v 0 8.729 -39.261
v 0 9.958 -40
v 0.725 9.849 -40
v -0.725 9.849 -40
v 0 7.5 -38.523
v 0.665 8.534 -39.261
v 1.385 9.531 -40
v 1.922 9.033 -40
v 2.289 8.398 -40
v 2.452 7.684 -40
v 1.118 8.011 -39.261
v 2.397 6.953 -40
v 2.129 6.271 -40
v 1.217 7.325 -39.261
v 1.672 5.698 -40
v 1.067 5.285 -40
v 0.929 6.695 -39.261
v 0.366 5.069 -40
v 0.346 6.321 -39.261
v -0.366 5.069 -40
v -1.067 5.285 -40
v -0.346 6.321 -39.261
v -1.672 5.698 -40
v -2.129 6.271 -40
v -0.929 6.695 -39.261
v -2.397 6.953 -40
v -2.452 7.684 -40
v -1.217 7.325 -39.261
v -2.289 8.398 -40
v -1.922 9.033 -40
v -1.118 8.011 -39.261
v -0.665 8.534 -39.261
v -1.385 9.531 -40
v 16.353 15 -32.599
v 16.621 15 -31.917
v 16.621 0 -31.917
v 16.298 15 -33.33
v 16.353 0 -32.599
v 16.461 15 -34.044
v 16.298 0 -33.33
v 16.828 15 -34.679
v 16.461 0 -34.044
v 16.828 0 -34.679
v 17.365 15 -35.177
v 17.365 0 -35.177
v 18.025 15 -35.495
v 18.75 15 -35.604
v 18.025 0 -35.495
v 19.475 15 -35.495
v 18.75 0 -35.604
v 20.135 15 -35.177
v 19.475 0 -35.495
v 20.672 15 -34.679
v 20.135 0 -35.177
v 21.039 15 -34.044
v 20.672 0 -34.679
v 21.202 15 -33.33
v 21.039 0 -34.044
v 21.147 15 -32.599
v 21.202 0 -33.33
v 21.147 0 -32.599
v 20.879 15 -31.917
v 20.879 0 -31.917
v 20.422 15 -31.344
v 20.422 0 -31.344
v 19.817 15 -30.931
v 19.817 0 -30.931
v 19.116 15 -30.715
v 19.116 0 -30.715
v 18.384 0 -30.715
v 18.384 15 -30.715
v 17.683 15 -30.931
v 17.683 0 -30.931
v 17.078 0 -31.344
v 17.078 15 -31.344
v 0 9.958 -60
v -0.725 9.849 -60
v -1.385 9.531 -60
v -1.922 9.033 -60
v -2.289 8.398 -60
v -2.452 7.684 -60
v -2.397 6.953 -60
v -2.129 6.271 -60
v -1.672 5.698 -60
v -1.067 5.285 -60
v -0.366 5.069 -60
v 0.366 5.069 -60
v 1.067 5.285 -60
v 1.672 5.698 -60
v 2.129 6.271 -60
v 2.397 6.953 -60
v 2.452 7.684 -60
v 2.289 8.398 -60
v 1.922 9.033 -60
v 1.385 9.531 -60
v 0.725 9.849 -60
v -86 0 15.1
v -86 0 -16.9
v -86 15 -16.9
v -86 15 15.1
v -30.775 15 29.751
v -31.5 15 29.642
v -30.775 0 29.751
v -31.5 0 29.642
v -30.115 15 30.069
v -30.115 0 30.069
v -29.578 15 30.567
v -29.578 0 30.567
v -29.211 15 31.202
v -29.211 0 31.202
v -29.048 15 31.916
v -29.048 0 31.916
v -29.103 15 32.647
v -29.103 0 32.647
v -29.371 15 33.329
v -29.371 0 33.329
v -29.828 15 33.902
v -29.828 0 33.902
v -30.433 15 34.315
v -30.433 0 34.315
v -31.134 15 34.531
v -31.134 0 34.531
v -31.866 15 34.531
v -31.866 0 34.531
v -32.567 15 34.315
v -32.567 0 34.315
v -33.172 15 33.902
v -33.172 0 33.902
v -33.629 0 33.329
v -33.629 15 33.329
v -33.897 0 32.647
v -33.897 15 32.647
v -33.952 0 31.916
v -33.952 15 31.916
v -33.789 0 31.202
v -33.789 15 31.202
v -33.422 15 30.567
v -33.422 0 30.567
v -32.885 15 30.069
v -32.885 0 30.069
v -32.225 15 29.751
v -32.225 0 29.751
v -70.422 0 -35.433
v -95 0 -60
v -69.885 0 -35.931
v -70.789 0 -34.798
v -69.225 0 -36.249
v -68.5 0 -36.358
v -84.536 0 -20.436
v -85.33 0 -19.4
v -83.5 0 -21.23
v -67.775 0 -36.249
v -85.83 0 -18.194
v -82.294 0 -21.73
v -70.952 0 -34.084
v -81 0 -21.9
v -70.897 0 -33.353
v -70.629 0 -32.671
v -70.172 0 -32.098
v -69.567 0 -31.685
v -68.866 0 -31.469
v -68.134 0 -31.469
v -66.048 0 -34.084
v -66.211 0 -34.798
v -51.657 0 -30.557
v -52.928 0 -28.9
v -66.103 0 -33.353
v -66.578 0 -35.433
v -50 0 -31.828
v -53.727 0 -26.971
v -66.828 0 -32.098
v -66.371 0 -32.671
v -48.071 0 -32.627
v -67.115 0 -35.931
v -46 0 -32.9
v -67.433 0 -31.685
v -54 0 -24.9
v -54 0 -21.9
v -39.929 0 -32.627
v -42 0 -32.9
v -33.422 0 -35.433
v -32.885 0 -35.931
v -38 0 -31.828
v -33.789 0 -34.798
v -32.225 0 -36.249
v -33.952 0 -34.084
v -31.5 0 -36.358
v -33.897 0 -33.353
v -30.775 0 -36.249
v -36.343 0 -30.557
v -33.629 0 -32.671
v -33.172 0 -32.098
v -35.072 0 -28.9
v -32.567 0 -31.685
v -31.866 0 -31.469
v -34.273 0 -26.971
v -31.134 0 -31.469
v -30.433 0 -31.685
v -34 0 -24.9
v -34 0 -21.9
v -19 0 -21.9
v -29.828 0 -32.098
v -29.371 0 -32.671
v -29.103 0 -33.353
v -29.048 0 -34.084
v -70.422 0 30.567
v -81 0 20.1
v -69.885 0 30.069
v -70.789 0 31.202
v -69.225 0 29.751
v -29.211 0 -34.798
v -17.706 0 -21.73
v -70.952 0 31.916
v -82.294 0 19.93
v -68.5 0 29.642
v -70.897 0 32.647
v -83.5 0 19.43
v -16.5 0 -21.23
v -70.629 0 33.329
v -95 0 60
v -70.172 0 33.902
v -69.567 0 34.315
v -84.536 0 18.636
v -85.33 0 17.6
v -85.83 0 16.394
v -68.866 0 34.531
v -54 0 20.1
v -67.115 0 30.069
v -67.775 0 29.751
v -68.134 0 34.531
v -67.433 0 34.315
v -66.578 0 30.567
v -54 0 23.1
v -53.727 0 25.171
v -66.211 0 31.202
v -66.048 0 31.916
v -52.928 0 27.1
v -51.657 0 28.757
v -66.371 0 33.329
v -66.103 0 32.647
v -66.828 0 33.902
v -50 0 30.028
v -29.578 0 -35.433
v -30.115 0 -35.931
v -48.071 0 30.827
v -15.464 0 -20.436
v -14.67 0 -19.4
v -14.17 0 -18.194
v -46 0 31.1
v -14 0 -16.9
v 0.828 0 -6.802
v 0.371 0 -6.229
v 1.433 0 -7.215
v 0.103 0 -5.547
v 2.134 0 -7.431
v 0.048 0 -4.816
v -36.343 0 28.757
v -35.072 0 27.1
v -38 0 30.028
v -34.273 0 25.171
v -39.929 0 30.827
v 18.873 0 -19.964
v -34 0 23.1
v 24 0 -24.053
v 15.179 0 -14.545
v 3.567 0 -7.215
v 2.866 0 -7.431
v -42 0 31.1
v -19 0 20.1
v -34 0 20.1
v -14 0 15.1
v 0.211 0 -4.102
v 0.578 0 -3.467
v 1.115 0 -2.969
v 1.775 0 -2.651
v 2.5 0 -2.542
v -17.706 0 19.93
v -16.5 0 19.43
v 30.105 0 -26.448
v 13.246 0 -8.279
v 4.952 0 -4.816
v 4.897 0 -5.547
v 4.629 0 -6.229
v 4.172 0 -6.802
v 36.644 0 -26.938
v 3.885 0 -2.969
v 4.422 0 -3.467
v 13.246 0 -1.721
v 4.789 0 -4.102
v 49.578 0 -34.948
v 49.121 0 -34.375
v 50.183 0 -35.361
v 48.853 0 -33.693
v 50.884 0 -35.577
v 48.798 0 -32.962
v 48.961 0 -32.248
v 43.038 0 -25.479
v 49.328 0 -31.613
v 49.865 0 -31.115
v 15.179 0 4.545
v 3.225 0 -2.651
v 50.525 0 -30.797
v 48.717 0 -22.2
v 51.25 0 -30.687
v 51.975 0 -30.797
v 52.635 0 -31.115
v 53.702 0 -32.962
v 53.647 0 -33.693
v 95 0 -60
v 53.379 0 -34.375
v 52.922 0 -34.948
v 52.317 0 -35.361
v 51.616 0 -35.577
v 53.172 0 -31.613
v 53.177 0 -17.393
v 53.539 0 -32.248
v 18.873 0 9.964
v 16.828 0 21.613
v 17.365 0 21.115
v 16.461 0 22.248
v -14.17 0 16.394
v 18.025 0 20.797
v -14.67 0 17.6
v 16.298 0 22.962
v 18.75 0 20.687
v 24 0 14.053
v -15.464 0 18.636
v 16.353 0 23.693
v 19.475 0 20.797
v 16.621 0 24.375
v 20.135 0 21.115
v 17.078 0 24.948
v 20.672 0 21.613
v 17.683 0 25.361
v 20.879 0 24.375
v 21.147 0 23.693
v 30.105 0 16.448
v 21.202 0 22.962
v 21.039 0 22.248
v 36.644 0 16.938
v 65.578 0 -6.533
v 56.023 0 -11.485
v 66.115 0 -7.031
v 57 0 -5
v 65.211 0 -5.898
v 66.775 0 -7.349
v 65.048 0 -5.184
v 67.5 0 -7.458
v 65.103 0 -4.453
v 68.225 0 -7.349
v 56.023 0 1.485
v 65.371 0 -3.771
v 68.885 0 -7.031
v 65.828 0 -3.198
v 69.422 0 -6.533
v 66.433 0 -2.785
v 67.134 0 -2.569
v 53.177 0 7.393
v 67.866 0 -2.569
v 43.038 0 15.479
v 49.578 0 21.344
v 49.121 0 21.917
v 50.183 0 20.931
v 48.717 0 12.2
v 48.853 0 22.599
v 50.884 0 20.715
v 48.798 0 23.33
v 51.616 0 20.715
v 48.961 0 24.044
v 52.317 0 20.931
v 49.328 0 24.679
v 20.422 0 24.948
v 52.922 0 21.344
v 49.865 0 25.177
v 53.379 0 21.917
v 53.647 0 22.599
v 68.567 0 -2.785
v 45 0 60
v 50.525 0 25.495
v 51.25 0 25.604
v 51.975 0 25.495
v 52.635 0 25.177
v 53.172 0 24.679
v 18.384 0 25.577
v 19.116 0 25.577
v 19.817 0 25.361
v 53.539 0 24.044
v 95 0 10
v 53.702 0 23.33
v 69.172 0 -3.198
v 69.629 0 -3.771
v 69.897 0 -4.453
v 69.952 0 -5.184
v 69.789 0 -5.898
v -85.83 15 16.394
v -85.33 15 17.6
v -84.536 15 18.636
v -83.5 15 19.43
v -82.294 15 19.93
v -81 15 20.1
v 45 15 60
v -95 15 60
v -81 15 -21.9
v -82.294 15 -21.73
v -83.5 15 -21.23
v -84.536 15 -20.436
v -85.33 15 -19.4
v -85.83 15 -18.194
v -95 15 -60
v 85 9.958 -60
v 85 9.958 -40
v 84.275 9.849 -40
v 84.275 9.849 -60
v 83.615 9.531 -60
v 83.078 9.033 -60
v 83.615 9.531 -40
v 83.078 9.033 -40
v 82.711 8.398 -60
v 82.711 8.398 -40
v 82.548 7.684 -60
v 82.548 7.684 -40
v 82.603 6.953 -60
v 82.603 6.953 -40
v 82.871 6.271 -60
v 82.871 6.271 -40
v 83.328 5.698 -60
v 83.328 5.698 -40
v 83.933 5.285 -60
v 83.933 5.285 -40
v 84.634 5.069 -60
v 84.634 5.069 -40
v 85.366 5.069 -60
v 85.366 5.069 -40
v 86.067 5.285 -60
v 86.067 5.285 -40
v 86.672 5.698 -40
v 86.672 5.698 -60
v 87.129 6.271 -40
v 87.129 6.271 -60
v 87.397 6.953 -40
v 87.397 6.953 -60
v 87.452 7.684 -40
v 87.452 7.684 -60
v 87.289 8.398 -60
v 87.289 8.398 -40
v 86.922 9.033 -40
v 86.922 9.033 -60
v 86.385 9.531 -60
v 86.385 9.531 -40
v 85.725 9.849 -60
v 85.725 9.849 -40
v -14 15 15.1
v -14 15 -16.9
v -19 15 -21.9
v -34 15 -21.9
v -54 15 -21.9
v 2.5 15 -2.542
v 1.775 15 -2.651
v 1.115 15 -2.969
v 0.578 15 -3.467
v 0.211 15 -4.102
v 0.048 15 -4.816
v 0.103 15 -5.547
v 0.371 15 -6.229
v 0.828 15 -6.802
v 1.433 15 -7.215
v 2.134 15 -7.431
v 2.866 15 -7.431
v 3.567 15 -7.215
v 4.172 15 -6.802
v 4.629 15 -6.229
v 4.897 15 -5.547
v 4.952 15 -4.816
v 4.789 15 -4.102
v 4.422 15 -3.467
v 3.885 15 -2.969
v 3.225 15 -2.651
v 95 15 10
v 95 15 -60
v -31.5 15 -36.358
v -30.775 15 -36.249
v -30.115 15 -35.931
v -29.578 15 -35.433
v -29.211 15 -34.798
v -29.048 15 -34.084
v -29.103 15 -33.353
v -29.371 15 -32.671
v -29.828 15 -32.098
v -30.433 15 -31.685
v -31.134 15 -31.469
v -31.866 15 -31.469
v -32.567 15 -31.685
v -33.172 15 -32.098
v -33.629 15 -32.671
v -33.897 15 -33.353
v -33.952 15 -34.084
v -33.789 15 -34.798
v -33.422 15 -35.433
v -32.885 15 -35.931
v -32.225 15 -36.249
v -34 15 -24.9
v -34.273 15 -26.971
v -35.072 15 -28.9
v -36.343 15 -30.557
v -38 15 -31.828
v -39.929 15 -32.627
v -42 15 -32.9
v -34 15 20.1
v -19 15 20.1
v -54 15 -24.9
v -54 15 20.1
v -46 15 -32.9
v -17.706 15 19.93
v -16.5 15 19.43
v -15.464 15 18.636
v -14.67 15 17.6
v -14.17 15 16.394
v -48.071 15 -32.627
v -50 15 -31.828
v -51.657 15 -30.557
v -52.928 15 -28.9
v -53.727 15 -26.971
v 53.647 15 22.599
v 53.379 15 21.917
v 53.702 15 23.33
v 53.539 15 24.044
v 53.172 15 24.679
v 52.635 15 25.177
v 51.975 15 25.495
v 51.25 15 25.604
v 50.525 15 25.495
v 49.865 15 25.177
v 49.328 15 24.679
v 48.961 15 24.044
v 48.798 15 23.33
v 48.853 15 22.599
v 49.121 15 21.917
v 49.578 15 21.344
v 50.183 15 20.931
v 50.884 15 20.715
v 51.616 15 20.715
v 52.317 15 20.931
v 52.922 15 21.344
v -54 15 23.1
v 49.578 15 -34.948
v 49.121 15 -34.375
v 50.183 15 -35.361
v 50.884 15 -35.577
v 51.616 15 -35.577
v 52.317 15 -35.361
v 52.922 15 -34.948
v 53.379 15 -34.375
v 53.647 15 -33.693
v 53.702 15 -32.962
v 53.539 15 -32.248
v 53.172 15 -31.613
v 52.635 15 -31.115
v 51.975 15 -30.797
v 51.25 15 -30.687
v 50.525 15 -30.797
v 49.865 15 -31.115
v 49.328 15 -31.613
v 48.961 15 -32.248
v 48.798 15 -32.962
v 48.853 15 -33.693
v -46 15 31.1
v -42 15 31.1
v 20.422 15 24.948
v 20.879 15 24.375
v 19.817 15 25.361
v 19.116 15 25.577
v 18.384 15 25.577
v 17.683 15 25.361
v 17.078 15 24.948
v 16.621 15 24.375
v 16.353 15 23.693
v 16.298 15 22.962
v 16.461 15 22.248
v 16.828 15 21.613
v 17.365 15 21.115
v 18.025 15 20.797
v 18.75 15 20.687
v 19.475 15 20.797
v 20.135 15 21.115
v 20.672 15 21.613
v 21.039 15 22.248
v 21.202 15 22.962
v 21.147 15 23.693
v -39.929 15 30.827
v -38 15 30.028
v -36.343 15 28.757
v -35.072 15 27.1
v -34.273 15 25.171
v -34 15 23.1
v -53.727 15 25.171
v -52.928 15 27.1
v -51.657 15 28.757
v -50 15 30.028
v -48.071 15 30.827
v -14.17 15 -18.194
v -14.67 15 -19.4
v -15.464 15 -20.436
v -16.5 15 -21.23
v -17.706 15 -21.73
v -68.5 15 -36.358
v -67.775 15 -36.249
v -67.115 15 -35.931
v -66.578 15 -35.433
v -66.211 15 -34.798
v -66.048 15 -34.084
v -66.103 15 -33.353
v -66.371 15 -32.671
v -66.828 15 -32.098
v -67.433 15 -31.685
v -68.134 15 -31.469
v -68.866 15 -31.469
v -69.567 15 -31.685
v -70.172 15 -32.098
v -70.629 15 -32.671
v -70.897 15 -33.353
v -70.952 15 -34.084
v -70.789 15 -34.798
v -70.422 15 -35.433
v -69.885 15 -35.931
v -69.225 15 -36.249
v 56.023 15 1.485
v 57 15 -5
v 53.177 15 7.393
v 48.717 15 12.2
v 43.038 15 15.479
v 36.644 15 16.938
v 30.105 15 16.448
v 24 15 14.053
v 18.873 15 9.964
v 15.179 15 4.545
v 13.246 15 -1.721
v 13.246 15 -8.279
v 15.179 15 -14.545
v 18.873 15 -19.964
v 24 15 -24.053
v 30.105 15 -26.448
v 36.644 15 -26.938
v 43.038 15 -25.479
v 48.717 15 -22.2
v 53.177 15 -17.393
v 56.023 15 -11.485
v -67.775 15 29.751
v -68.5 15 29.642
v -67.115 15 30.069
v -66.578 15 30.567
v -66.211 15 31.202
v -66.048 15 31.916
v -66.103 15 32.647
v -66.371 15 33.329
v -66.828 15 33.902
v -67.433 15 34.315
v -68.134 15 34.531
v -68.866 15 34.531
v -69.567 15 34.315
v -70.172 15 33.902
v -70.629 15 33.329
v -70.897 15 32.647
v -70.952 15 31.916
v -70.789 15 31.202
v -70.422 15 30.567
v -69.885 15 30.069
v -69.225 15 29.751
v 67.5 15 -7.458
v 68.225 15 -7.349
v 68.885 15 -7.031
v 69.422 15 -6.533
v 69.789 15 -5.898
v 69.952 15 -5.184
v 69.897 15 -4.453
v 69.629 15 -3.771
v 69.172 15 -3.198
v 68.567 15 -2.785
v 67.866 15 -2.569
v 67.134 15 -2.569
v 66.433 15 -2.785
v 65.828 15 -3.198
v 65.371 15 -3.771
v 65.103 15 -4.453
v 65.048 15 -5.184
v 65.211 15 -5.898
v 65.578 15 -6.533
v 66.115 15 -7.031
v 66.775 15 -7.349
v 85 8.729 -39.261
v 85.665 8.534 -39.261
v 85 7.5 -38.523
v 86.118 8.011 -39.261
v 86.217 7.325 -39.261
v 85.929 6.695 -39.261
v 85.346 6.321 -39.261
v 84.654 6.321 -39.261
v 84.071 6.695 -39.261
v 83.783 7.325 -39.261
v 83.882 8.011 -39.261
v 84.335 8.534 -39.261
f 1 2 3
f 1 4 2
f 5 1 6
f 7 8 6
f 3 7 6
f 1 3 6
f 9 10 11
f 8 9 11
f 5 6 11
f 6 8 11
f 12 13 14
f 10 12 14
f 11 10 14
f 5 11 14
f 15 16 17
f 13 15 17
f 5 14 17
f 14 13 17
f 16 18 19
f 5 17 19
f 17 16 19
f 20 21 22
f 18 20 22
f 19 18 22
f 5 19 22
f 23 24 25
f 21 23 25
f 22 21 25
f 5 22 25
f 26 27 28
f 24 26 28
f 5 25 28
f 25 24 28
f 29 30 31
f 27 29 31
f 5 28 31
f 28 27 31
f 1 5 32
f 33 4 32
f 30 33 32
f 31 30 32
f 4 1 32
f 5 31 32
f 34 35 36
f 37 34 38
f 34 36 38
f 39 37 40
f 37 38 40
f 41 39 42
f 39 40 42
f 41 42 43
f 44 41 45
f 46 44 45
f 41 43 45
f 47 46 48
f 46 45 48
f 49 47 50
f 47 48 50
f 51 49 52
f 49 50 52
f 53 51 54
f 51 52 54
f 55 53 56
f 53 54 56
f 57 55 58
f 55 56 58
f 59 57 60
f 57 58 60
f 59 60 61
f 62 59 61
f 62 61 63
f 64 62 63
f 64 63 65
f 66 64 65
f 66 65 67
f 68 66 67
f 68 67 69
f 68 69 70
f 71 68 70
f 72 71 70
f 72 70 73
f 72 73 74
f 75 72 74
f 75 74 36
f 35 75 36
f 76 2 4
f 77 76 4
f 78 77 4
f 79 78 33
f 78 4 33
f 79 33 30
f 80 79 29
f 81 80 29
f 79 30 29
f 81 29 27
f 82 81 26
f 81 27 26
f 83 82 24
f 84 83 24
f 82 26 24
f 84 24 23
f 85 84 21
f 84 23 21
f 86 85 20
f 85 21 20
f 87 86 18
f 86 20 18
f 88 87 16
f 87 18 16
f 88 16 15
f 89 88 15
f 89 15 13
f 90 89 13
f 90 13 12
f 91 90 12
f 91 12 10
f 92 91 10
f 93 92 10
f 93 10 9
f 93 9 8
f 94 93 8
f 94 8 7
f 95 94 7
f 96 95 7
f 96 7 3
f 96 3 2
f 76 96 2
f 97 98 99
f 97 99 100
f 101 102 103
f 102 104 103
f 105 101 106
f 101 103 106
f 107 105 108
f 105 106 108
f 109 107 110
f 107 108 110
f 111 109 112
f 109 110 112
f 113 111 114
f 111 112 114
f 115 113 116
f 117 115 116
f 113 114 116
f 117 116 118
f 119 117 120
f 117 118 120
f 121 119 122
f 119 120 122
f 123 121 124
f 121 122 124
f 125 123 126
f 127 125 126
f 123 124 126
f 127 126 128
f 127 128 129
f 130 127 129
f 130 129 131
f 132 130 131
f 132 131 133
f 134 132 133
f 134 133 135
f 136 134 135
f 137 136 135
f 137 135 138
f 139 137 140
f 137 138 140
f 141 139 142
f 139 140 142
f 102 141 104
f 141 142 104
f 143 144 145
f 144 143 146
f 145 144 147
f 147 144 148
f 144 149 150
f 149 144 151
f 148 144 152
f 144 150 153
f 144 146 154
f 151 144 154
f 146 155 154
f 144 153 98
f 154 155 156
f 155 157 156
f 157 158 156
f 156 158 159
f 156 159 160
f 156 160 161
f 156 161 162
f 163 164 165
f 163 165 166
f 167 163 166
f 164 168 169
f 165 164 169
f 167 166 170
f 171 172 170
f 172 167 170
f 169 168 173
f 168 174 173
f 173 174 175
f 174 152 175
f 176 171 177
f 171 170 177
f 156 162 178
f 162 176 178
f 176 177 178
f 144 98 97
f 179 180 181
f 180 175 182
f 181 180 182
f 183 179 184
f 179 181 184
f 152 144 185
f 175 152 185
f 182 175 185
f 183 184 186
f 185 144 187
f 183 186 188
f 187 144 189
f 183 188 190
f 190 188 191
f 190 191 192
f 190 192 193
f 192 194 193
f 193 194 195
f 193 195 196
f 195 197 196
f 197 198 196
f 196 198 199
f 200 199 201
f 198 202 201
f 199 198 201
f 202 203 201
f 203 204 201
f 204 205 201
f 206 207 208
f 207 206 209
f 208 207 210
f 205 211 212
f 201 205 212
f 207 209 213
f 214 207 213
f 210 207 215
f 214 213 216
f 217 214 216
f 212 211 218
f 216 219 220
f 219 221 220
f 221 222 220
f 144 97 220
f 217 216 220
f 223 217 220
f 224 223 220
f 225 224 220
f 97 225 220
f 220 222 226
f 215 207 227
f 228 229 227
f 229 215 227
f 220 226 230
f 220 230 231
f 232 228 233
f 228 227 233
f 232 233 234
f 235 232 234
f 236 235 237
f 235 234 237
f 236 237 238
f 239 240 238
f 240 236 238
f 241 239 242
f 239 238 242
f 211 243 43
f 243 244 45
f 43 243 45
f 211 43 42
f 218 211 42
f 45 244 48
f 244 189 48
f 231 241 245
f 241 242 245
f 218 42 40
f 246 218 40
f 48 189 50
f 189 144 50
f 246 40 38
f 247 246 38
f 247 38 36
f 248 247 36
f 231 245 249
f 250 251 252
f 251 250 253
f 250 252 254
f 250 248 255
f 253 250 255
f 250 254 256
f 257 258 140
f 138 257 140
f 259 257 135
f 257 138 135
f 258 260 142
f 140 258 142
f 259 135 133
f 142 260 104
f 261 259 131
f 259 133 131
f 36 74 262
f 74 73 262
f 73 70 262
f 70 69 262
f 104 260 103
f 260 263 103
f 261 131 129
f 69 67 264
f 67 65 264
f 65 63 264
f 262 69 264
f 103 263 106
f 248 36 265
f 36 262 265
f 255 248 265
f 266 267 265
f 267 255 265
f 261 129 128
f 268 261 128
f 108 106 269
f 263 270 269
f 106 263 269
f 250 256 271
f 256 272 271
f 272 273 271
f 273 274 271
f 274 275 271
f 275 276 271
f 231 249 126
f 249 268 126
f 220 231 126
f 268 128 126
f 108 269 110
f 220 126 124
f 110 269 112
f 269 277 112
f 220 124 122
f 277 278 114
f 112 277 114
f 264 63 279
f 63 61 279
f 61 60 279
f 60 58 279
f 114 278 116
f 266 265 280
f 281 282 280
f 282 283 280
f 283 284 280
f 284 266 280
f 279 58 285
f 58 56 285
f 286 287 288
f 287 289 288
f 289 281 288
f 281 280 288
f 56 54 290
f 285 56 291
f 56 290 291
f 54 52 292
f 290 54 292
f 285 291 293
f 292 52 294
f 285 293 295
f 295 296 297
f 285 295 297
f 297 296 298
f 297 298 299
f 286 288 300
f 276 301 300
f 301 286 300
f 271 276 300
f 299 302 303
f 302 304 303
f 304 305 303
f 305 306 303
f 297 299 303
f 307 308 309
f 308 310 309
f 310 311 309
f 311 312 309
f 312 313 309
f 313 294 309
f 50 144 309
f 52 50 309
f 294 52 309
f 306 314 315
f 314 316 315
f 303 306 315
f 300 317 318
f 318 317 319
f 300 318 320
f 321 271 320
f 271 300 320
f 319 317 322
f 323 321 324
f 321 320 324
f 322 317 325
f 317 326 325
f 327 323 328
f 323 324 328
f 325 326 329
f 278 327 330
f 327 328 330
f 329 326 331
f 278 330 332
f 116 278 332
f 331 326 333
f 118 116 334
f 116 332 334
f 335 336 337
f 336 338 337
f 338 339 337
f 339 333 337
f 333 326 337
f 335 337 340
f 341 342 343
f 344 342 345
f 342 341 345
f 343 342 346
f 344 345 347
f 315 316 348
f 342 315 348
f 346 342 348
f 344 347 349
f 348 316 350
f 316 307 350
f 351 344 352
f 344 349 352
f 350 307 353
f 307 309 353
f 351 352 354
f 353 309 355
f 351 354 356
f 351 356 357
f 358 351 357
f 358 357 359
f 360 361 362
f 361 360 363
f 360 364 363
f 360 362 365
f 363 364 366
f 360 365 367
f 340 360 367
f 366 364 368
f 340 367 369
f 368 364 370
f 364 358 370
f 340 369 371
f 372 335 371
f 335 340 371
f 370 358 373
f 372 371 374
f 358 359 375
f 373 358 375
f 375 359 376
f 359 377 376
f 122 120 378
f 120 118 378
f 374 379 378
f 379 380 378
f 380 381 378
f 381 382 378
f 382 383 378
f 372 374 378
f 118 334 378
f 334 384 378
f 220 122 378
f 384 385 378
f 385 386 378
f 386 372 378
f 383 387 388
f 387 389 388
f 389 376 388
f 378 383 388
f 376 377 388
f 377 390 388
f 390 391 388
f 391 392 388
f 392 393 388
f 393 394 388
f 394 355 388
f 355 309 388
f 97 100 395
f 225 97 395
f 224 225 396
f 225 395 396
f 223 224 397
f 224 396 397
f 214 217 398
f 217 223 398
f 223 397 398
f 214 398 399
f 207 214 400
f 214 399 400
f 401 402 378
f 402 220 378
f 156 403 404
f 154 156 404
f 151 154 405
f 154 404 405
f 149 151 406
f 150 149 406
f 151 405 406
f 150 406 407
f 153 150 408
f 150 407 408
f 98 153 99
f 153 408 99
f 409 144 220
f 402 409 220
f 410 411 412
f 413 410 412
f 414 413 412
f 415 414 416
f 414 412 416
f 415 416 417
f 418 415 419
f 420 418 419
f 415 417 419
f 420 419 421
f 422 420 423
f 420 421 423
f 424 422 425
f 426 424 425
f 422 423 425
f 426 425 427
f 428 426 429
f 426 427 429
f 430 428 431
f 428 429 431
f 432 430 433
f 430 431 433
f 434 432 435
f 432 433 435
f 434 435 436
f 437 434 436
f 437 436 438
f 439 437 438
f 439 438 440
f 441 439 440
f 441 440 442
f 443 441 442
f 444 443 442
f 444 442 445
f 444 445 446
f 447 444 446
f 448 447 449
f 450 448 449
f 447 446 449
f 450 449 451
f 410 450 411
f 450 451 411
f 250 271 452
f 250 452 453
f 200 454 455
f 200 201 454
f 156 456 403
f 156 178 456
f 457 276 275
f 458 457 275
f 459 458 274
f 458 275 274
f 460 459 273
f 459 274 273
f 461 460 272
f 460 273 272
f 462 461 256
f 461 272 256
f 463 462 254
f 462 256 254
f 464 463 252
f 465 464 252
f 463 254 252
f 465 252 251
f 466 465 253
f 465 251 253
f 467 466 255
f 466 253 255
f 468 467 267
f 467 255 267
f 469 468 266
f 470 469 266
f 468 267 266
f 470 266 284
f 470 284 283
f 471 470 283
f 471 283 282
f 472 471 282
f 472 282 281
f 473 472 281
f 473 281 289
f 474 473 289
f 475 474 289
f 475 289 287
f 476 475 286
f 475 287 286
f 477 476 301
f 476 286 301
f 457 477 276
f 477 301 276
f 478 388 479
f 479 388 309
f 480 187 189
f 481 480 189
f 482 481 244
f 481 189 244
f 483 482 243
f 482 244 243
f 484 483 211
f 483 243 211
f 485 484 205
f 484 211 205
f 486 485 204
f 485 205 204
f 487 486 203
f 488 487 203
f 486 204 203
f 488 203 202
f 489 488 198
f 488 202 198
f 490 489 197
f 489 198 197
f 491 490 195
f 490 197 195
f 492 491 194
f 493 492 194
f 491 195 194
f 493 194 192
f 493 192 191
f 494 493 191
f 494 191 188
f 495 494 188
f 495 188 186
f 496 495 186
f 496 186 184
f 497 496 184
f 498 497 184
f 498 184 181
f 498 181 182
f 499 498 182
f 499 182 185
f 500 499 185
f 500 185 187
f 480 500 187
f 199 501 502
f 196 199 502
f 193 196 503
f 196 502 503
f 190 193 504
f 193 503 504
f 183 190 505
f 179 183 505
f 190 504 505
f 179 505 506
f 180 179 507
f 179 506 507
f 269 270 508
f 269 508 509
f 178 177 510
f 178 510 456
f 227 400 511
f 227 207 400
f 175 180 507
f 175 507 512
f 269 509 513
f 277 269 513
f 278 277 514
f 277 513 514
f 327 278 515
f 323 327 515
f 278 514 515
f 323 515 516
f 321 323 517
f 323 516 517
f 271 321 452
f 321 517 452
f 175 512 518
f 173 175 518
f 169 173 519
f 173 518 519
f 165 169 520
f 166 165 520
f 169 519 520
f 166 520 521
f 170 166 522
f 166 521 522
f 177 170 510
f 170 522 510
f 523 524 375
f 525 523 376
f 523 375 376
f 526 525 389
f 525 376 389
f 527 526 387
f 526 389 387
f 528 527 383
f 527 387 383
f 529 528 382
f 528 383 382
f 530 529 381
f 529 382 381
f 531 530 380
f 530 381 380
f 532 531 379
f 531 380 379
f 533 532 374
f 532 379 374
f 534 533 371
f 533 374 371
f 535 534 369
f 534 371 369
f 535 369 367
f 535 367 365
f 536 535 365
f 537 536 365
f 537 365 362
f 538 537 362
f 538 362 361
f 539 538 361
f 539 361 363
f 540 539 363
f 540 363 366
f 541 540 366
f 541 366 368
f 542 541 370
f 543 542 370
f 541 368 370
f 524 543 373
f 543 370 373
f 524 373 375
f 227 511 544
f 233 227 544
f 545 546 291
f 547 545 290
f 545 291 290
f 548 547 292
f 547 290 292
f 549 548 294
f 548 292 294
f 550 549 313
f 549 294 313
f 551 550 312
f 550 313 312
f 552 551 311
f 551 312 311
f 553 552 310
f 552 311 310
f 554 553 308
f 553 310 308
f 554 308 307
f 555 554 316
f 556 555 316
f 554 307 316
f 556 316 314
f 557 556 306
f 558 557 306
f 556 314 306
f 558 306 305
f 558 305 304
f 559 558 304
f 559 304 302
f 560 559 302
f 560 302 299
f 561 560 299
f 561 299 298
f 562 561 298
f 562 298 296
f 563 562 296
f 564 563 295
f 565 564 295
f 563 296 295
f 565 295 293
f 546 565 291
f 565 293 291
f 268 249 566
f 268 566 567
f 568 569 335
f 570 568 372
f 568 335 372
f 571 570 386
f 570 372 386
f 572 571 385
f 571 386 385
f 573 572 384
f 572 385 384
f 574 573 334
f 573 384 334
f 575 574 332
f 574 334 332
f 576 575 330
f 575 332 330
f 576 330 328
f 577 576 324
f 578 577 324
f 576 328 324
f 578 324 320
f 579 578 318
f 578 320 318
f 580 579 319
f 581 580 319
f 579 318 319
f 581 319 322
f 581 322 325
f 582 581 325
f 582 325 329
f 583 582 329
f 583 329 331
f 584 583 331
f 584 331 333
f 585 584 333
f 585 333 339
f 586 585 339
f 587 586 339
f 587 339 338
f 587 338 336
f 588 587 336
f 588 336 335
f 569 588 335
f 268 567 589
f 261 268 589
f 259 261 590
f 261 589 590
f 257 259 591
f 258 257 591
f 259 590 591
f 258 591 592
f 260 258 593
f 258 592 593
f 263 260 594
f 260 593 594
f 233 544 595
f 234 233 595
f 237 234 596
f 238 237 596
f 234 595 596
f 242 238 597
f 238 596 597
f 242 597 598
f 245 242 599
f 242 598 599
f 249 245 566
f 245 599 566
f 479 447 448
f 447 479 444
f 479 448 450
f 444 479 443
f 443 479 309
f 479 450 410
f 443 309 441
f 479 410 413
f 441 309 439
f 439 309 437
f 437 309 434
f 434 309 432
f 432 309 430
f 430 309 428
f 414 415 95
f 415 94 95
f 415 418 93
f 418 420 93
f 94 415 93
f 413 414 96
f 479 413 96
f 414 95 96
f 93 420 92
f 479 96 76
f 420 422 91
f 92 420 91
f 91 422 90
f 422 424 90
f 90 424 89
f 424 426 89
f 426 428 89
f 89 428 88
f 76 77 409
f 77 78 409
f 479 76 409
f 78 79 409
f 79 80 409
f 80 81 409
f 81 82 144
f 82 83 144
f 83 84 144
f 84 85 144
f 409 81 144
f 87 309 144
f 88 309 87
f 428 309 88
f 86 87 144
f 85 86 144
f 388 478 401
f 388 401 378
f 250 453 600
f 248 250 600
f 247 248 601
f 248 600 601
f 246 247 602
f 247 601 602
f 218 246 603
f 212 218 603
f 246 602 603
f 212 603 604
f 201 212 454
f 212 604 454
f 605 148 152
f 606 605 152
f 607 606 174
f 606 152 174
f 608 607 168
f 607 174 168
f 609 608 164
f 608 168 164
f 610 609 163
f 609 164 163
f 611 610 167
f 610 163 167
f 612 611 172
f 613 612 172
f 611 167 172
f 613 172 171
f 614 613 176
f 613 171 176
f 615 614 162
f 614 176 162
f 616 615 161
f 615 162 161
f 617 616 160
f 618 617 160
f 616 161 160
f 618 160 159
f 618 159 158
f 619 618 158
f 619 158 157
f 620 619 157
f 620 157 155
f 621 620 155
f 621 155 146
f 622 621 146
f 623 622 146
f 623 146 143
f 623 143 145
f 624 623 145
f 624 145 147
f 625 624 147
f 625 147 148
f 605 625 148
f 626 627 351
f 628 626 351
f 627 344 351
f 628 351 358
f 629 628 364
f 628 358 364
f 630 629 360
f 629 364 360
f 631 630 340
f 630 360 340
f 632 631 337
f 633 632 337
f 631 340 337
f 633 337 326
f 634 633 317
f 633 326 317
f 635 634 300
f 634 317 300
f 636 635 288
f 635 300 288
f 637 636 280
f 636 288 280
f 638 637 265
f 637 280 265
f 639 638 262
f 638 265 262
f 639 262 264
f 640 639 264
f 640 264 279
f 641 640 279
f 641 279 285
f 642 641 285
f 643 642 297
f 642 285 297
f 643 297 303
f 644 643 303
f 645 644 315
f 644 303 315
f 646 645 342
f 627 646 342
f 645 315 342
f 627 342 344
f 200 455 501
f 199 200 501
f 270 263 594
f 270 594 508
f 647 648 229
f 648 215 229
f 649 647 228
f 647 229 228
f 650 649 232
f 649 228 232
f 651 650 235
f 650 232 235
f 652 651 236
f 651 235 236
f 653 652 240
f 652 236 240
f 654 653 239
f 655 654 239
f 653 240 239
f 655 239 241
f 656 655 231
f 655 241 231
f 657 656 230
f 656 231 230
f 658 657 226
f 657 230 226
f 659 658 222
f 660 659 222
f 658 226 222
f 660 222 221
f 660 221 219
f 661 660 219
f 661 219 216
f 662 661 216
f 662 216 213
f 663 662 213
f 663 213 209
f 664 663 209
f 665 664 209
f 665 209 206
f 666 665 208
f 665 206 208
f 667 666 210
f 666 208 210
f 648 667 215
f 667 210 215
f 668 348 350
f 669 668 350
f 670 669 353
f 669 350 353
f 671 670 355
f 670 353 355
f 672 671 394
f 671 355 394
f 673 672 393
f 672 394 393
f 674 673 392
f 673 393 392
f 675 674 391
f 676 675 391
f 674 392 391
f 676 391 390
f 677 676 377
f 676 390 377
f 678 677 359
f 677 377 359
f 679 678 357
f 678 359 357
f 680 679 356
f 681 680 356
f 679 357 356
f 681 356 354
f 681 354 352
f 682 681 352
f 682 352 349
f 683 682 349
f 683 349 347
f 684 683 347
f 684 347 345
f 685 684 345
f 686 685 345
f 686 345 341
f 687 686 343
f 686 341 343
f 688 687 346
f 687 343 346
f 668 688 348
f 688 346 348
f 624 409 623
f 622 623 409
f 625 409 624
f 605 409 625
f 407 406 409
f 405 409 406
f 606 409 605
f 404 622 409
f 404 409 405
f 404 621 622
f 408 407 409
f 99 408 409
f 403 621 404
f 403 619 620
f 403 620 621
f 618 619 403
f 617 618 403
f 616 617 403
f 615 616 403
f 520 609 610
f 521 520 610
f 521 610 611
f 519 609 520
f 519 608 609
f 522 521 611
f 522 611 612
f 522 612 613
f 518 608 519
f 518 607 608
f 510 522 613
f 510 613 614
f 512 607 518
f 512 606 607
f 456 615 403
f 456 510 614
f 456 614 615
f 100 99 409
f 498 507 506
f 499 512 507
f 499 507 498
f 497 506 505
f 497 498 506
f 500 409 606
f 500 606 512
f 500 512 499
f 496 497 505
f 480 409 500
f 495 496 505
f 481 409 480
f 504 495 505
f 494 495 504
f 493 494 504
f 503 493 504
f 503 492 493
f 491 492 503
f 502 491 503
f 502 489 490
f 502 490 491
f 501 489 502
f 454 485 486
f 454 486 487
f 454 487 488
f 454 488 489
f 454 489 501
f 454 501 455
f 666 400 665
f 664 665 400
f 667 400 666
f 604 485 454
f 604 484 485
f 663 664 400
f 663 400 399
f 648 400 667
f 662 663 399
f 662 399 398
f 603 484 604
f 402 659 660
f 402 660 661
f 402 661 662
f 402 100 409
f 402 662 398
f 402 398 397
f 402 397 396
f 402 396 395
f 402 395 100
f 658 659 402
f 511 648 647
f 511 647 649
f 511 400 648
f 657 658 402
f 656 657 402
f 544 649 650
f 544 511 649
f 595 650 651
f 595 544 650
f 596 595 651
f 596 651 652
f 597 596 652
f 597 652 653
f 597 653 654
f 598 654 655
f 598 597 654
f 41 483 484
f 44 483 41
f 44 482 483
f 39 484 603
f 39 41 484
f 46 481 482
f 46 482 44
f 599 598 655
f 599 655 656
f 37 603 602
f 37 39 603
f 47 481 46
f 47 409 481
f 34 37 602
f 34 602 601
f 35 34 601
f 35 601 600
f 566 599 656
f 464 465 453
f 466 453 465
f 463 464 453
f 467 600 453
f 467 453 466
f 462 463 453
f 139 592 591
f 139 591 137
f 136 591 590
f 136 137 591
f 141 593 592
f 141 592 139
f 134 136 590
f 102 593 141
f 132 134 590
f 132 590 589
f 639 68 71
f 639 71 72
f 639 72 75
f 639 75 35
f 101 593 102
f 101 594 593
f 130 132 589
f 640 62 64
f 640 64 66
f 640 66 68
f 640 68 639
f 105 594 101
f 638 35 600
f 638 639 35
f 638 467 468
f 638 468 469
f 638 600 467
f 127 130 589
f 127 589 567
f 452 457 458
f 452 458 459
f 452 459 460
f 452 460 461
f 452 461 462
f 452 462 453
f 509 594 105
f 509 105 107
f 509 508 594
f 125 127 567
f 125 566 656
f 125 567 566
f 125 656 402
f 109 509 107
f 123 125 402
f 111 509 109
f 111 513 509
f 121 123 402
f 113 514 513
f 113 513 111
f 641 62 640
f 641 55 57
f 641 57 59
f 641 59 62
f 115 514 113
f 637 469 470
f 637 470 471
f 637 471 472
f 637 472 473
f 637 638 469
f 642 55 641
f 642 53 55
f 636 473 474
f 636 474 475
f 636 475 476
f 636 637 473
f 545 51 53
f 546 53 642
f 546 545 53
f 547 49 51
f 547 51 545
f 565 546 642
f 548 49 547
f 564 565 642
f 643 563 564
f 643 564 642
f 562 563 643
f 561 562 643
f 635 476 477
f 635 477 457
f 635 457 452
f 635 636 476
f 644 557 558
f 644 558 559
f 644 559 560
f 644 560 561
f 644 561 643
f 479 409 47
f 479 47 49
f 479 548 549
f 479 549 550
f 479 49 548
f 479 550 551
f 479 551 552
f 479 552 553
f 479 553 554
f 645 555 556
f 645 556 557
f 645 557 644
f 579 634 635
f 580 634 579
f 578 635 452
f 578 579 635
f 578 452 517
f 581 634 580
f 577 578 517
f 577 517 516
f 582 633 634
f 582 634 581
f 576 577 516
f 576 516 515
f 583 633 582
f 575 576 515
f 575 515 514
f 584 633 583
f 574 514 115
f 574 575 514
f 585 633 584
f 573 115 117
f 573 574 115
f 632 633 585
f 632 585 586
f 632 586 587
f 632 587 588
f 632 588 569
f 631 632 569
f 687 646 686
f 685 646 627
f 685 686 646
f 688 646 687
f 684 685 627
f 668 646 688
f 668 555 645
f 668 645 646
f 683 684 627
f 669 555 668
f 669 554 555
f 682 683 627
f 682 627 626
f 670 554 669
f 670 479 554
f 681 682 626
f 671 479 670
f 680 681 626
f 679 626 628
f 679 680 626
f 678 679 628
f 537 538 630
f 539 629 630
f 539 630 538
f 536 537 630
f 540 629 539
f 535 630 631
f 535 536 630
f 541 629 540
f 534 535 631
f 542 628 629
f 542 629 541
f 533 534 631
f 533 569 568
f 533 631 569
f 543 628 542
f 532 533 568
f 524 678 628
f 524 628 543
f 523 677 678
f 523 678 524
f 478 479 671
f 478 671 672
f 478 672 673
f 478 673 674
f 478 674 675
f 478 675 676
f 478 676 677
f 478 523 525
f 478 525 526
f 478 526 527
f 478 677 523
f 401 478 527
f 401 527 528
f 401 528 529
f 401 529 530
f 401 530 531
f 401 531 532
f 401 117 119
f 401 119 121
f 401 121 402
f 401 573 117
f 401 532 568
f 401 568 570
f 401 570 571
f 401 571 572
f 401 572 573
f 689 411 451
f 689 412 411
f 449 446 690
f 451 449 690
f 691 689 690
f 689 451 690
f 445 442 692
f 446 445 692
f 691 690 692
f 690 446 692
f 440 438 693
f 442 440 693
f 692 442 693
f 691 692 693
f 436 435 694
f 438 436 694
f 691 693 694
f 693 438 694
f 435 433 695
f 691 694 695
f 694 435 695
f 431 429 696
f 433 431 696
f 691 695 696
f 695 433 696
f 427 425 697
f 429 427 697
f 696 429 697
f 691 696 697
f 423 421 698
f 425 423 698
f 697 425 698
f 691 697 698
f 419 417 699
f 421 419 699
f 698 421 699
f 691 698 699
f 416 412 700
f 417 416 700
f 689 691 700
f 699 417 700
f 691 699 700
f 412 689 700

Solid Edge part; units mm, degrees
sketch "Sketch1" plane through (0, 0, 0) normal (0, -1, 0) x (1, 0, 0)
  line L0 (-95, 60) -> (95, 60)
  line L1 (95, 60) -> (95, -60)
  line L2 (95, -60) -> (-95, -60)
  line L3 (-95, -60) -> (-95, 60)
  dimension "D1" = 190
  dimension "D2" = 120
extrude "Protrusion1" add sketch "Sketch1" against normal blind 15
sketch "Sketch2" plane through (0, 0, 0) normal (0, -1, 0) x (1, 0, 0)
  line L0 (-86, 20.1) -> (-14, 20.1)
  line L1 (-14, 20.1) -> (-14, -21.9)
  line L2 (-14, -21.9) -> (-86, -21.9)
  line L3 (-86, -21.9) -> (-86, 20.1)
  circle A0 centre (35, -5) radius 22
  dimension "D1" = 55
  dimension "D2" = 60
  dimension "D3" = 44
  dimension "D4" = 72
  dimension "D5" = 42
  dimension "D6" = 4.1
  dimension "D7" = 145
extrude "Cutout1" cut sketch "Sketch2" against normal up to vertex (15 mm away)
fillet "Redondeo_1" radius 5 4 edges at (-86, 7.5, 20.1) (-14, 7.5, 20.1) (-86, 7.5, -21.9) (-14, 7.5, -21.9)
hole "Agujero_1" at (85, 7.5, -60) direction (0, 0, 1) diameter 4.917 depth 20 tip angle 118 thread major 6 thread length 10
hole "Hole1" at (0, 7.5, -60) direction (0, 0, 1) diameter 4.917 depth 20 tip angle 118 thread major 6 thread length 10
hole "Agujero_4" at (67.5, 0, -5) direction (0, 1, 0) diameter 4.917 end up to next
pattern_circular "Pattern2" count 6 over 360 about axis through (35, 0, -5) along (0, -1, 0) of "Agujero_4"
hole "Agujero_10" at (-68.5, 0, 32.1) direction (0, 1, 0) diameter 4.917 end through all
hole "Hole7" at (-31.5, 0, 32.1) direction (0, 1, 0) diameter 4.917 end through all
hole "Hole8" at (-68.5, 0, -33.9) direction (0, 1, 0) diameter 4.917 end through all
hole "Hole9" at (-31.5, 0, -33.9) direction (0, 1, 0) diameter 4.917 end through all
chamfer "Chaflán_1" distance 50 angle 45 1 edges at (95, 7.5, 60)
sketch "Sketch3" plane through (0, 0, 0) normal (0, -1, 0) x (1, 0, 0)
  line L0 (-54, 31.1) -> (-34, 31.1)
  line L1 (-34, 31.1) -> (-34, -32.9)
  line L2 (-34, -32.9) -> (-54, -32.9)
  line L3 (-54, -32.9) -> (-54, 31.1)
  dimension "D1" = 20
  dimension "D2" = 64
  dimension "D3" = 20
extrude "Cutout2" cut sketch "Sketch3" against normal through all
fillet "Redondeo_2" radius 8 4 edges at (-34, 7.5, 31.1) (-54, 7.5, 31.1) (-54, 7.5, -32.9) (-34, 7.5, -32.9)
properties part number "1976-1200-005" material "Aluminio, 7075-T6"
